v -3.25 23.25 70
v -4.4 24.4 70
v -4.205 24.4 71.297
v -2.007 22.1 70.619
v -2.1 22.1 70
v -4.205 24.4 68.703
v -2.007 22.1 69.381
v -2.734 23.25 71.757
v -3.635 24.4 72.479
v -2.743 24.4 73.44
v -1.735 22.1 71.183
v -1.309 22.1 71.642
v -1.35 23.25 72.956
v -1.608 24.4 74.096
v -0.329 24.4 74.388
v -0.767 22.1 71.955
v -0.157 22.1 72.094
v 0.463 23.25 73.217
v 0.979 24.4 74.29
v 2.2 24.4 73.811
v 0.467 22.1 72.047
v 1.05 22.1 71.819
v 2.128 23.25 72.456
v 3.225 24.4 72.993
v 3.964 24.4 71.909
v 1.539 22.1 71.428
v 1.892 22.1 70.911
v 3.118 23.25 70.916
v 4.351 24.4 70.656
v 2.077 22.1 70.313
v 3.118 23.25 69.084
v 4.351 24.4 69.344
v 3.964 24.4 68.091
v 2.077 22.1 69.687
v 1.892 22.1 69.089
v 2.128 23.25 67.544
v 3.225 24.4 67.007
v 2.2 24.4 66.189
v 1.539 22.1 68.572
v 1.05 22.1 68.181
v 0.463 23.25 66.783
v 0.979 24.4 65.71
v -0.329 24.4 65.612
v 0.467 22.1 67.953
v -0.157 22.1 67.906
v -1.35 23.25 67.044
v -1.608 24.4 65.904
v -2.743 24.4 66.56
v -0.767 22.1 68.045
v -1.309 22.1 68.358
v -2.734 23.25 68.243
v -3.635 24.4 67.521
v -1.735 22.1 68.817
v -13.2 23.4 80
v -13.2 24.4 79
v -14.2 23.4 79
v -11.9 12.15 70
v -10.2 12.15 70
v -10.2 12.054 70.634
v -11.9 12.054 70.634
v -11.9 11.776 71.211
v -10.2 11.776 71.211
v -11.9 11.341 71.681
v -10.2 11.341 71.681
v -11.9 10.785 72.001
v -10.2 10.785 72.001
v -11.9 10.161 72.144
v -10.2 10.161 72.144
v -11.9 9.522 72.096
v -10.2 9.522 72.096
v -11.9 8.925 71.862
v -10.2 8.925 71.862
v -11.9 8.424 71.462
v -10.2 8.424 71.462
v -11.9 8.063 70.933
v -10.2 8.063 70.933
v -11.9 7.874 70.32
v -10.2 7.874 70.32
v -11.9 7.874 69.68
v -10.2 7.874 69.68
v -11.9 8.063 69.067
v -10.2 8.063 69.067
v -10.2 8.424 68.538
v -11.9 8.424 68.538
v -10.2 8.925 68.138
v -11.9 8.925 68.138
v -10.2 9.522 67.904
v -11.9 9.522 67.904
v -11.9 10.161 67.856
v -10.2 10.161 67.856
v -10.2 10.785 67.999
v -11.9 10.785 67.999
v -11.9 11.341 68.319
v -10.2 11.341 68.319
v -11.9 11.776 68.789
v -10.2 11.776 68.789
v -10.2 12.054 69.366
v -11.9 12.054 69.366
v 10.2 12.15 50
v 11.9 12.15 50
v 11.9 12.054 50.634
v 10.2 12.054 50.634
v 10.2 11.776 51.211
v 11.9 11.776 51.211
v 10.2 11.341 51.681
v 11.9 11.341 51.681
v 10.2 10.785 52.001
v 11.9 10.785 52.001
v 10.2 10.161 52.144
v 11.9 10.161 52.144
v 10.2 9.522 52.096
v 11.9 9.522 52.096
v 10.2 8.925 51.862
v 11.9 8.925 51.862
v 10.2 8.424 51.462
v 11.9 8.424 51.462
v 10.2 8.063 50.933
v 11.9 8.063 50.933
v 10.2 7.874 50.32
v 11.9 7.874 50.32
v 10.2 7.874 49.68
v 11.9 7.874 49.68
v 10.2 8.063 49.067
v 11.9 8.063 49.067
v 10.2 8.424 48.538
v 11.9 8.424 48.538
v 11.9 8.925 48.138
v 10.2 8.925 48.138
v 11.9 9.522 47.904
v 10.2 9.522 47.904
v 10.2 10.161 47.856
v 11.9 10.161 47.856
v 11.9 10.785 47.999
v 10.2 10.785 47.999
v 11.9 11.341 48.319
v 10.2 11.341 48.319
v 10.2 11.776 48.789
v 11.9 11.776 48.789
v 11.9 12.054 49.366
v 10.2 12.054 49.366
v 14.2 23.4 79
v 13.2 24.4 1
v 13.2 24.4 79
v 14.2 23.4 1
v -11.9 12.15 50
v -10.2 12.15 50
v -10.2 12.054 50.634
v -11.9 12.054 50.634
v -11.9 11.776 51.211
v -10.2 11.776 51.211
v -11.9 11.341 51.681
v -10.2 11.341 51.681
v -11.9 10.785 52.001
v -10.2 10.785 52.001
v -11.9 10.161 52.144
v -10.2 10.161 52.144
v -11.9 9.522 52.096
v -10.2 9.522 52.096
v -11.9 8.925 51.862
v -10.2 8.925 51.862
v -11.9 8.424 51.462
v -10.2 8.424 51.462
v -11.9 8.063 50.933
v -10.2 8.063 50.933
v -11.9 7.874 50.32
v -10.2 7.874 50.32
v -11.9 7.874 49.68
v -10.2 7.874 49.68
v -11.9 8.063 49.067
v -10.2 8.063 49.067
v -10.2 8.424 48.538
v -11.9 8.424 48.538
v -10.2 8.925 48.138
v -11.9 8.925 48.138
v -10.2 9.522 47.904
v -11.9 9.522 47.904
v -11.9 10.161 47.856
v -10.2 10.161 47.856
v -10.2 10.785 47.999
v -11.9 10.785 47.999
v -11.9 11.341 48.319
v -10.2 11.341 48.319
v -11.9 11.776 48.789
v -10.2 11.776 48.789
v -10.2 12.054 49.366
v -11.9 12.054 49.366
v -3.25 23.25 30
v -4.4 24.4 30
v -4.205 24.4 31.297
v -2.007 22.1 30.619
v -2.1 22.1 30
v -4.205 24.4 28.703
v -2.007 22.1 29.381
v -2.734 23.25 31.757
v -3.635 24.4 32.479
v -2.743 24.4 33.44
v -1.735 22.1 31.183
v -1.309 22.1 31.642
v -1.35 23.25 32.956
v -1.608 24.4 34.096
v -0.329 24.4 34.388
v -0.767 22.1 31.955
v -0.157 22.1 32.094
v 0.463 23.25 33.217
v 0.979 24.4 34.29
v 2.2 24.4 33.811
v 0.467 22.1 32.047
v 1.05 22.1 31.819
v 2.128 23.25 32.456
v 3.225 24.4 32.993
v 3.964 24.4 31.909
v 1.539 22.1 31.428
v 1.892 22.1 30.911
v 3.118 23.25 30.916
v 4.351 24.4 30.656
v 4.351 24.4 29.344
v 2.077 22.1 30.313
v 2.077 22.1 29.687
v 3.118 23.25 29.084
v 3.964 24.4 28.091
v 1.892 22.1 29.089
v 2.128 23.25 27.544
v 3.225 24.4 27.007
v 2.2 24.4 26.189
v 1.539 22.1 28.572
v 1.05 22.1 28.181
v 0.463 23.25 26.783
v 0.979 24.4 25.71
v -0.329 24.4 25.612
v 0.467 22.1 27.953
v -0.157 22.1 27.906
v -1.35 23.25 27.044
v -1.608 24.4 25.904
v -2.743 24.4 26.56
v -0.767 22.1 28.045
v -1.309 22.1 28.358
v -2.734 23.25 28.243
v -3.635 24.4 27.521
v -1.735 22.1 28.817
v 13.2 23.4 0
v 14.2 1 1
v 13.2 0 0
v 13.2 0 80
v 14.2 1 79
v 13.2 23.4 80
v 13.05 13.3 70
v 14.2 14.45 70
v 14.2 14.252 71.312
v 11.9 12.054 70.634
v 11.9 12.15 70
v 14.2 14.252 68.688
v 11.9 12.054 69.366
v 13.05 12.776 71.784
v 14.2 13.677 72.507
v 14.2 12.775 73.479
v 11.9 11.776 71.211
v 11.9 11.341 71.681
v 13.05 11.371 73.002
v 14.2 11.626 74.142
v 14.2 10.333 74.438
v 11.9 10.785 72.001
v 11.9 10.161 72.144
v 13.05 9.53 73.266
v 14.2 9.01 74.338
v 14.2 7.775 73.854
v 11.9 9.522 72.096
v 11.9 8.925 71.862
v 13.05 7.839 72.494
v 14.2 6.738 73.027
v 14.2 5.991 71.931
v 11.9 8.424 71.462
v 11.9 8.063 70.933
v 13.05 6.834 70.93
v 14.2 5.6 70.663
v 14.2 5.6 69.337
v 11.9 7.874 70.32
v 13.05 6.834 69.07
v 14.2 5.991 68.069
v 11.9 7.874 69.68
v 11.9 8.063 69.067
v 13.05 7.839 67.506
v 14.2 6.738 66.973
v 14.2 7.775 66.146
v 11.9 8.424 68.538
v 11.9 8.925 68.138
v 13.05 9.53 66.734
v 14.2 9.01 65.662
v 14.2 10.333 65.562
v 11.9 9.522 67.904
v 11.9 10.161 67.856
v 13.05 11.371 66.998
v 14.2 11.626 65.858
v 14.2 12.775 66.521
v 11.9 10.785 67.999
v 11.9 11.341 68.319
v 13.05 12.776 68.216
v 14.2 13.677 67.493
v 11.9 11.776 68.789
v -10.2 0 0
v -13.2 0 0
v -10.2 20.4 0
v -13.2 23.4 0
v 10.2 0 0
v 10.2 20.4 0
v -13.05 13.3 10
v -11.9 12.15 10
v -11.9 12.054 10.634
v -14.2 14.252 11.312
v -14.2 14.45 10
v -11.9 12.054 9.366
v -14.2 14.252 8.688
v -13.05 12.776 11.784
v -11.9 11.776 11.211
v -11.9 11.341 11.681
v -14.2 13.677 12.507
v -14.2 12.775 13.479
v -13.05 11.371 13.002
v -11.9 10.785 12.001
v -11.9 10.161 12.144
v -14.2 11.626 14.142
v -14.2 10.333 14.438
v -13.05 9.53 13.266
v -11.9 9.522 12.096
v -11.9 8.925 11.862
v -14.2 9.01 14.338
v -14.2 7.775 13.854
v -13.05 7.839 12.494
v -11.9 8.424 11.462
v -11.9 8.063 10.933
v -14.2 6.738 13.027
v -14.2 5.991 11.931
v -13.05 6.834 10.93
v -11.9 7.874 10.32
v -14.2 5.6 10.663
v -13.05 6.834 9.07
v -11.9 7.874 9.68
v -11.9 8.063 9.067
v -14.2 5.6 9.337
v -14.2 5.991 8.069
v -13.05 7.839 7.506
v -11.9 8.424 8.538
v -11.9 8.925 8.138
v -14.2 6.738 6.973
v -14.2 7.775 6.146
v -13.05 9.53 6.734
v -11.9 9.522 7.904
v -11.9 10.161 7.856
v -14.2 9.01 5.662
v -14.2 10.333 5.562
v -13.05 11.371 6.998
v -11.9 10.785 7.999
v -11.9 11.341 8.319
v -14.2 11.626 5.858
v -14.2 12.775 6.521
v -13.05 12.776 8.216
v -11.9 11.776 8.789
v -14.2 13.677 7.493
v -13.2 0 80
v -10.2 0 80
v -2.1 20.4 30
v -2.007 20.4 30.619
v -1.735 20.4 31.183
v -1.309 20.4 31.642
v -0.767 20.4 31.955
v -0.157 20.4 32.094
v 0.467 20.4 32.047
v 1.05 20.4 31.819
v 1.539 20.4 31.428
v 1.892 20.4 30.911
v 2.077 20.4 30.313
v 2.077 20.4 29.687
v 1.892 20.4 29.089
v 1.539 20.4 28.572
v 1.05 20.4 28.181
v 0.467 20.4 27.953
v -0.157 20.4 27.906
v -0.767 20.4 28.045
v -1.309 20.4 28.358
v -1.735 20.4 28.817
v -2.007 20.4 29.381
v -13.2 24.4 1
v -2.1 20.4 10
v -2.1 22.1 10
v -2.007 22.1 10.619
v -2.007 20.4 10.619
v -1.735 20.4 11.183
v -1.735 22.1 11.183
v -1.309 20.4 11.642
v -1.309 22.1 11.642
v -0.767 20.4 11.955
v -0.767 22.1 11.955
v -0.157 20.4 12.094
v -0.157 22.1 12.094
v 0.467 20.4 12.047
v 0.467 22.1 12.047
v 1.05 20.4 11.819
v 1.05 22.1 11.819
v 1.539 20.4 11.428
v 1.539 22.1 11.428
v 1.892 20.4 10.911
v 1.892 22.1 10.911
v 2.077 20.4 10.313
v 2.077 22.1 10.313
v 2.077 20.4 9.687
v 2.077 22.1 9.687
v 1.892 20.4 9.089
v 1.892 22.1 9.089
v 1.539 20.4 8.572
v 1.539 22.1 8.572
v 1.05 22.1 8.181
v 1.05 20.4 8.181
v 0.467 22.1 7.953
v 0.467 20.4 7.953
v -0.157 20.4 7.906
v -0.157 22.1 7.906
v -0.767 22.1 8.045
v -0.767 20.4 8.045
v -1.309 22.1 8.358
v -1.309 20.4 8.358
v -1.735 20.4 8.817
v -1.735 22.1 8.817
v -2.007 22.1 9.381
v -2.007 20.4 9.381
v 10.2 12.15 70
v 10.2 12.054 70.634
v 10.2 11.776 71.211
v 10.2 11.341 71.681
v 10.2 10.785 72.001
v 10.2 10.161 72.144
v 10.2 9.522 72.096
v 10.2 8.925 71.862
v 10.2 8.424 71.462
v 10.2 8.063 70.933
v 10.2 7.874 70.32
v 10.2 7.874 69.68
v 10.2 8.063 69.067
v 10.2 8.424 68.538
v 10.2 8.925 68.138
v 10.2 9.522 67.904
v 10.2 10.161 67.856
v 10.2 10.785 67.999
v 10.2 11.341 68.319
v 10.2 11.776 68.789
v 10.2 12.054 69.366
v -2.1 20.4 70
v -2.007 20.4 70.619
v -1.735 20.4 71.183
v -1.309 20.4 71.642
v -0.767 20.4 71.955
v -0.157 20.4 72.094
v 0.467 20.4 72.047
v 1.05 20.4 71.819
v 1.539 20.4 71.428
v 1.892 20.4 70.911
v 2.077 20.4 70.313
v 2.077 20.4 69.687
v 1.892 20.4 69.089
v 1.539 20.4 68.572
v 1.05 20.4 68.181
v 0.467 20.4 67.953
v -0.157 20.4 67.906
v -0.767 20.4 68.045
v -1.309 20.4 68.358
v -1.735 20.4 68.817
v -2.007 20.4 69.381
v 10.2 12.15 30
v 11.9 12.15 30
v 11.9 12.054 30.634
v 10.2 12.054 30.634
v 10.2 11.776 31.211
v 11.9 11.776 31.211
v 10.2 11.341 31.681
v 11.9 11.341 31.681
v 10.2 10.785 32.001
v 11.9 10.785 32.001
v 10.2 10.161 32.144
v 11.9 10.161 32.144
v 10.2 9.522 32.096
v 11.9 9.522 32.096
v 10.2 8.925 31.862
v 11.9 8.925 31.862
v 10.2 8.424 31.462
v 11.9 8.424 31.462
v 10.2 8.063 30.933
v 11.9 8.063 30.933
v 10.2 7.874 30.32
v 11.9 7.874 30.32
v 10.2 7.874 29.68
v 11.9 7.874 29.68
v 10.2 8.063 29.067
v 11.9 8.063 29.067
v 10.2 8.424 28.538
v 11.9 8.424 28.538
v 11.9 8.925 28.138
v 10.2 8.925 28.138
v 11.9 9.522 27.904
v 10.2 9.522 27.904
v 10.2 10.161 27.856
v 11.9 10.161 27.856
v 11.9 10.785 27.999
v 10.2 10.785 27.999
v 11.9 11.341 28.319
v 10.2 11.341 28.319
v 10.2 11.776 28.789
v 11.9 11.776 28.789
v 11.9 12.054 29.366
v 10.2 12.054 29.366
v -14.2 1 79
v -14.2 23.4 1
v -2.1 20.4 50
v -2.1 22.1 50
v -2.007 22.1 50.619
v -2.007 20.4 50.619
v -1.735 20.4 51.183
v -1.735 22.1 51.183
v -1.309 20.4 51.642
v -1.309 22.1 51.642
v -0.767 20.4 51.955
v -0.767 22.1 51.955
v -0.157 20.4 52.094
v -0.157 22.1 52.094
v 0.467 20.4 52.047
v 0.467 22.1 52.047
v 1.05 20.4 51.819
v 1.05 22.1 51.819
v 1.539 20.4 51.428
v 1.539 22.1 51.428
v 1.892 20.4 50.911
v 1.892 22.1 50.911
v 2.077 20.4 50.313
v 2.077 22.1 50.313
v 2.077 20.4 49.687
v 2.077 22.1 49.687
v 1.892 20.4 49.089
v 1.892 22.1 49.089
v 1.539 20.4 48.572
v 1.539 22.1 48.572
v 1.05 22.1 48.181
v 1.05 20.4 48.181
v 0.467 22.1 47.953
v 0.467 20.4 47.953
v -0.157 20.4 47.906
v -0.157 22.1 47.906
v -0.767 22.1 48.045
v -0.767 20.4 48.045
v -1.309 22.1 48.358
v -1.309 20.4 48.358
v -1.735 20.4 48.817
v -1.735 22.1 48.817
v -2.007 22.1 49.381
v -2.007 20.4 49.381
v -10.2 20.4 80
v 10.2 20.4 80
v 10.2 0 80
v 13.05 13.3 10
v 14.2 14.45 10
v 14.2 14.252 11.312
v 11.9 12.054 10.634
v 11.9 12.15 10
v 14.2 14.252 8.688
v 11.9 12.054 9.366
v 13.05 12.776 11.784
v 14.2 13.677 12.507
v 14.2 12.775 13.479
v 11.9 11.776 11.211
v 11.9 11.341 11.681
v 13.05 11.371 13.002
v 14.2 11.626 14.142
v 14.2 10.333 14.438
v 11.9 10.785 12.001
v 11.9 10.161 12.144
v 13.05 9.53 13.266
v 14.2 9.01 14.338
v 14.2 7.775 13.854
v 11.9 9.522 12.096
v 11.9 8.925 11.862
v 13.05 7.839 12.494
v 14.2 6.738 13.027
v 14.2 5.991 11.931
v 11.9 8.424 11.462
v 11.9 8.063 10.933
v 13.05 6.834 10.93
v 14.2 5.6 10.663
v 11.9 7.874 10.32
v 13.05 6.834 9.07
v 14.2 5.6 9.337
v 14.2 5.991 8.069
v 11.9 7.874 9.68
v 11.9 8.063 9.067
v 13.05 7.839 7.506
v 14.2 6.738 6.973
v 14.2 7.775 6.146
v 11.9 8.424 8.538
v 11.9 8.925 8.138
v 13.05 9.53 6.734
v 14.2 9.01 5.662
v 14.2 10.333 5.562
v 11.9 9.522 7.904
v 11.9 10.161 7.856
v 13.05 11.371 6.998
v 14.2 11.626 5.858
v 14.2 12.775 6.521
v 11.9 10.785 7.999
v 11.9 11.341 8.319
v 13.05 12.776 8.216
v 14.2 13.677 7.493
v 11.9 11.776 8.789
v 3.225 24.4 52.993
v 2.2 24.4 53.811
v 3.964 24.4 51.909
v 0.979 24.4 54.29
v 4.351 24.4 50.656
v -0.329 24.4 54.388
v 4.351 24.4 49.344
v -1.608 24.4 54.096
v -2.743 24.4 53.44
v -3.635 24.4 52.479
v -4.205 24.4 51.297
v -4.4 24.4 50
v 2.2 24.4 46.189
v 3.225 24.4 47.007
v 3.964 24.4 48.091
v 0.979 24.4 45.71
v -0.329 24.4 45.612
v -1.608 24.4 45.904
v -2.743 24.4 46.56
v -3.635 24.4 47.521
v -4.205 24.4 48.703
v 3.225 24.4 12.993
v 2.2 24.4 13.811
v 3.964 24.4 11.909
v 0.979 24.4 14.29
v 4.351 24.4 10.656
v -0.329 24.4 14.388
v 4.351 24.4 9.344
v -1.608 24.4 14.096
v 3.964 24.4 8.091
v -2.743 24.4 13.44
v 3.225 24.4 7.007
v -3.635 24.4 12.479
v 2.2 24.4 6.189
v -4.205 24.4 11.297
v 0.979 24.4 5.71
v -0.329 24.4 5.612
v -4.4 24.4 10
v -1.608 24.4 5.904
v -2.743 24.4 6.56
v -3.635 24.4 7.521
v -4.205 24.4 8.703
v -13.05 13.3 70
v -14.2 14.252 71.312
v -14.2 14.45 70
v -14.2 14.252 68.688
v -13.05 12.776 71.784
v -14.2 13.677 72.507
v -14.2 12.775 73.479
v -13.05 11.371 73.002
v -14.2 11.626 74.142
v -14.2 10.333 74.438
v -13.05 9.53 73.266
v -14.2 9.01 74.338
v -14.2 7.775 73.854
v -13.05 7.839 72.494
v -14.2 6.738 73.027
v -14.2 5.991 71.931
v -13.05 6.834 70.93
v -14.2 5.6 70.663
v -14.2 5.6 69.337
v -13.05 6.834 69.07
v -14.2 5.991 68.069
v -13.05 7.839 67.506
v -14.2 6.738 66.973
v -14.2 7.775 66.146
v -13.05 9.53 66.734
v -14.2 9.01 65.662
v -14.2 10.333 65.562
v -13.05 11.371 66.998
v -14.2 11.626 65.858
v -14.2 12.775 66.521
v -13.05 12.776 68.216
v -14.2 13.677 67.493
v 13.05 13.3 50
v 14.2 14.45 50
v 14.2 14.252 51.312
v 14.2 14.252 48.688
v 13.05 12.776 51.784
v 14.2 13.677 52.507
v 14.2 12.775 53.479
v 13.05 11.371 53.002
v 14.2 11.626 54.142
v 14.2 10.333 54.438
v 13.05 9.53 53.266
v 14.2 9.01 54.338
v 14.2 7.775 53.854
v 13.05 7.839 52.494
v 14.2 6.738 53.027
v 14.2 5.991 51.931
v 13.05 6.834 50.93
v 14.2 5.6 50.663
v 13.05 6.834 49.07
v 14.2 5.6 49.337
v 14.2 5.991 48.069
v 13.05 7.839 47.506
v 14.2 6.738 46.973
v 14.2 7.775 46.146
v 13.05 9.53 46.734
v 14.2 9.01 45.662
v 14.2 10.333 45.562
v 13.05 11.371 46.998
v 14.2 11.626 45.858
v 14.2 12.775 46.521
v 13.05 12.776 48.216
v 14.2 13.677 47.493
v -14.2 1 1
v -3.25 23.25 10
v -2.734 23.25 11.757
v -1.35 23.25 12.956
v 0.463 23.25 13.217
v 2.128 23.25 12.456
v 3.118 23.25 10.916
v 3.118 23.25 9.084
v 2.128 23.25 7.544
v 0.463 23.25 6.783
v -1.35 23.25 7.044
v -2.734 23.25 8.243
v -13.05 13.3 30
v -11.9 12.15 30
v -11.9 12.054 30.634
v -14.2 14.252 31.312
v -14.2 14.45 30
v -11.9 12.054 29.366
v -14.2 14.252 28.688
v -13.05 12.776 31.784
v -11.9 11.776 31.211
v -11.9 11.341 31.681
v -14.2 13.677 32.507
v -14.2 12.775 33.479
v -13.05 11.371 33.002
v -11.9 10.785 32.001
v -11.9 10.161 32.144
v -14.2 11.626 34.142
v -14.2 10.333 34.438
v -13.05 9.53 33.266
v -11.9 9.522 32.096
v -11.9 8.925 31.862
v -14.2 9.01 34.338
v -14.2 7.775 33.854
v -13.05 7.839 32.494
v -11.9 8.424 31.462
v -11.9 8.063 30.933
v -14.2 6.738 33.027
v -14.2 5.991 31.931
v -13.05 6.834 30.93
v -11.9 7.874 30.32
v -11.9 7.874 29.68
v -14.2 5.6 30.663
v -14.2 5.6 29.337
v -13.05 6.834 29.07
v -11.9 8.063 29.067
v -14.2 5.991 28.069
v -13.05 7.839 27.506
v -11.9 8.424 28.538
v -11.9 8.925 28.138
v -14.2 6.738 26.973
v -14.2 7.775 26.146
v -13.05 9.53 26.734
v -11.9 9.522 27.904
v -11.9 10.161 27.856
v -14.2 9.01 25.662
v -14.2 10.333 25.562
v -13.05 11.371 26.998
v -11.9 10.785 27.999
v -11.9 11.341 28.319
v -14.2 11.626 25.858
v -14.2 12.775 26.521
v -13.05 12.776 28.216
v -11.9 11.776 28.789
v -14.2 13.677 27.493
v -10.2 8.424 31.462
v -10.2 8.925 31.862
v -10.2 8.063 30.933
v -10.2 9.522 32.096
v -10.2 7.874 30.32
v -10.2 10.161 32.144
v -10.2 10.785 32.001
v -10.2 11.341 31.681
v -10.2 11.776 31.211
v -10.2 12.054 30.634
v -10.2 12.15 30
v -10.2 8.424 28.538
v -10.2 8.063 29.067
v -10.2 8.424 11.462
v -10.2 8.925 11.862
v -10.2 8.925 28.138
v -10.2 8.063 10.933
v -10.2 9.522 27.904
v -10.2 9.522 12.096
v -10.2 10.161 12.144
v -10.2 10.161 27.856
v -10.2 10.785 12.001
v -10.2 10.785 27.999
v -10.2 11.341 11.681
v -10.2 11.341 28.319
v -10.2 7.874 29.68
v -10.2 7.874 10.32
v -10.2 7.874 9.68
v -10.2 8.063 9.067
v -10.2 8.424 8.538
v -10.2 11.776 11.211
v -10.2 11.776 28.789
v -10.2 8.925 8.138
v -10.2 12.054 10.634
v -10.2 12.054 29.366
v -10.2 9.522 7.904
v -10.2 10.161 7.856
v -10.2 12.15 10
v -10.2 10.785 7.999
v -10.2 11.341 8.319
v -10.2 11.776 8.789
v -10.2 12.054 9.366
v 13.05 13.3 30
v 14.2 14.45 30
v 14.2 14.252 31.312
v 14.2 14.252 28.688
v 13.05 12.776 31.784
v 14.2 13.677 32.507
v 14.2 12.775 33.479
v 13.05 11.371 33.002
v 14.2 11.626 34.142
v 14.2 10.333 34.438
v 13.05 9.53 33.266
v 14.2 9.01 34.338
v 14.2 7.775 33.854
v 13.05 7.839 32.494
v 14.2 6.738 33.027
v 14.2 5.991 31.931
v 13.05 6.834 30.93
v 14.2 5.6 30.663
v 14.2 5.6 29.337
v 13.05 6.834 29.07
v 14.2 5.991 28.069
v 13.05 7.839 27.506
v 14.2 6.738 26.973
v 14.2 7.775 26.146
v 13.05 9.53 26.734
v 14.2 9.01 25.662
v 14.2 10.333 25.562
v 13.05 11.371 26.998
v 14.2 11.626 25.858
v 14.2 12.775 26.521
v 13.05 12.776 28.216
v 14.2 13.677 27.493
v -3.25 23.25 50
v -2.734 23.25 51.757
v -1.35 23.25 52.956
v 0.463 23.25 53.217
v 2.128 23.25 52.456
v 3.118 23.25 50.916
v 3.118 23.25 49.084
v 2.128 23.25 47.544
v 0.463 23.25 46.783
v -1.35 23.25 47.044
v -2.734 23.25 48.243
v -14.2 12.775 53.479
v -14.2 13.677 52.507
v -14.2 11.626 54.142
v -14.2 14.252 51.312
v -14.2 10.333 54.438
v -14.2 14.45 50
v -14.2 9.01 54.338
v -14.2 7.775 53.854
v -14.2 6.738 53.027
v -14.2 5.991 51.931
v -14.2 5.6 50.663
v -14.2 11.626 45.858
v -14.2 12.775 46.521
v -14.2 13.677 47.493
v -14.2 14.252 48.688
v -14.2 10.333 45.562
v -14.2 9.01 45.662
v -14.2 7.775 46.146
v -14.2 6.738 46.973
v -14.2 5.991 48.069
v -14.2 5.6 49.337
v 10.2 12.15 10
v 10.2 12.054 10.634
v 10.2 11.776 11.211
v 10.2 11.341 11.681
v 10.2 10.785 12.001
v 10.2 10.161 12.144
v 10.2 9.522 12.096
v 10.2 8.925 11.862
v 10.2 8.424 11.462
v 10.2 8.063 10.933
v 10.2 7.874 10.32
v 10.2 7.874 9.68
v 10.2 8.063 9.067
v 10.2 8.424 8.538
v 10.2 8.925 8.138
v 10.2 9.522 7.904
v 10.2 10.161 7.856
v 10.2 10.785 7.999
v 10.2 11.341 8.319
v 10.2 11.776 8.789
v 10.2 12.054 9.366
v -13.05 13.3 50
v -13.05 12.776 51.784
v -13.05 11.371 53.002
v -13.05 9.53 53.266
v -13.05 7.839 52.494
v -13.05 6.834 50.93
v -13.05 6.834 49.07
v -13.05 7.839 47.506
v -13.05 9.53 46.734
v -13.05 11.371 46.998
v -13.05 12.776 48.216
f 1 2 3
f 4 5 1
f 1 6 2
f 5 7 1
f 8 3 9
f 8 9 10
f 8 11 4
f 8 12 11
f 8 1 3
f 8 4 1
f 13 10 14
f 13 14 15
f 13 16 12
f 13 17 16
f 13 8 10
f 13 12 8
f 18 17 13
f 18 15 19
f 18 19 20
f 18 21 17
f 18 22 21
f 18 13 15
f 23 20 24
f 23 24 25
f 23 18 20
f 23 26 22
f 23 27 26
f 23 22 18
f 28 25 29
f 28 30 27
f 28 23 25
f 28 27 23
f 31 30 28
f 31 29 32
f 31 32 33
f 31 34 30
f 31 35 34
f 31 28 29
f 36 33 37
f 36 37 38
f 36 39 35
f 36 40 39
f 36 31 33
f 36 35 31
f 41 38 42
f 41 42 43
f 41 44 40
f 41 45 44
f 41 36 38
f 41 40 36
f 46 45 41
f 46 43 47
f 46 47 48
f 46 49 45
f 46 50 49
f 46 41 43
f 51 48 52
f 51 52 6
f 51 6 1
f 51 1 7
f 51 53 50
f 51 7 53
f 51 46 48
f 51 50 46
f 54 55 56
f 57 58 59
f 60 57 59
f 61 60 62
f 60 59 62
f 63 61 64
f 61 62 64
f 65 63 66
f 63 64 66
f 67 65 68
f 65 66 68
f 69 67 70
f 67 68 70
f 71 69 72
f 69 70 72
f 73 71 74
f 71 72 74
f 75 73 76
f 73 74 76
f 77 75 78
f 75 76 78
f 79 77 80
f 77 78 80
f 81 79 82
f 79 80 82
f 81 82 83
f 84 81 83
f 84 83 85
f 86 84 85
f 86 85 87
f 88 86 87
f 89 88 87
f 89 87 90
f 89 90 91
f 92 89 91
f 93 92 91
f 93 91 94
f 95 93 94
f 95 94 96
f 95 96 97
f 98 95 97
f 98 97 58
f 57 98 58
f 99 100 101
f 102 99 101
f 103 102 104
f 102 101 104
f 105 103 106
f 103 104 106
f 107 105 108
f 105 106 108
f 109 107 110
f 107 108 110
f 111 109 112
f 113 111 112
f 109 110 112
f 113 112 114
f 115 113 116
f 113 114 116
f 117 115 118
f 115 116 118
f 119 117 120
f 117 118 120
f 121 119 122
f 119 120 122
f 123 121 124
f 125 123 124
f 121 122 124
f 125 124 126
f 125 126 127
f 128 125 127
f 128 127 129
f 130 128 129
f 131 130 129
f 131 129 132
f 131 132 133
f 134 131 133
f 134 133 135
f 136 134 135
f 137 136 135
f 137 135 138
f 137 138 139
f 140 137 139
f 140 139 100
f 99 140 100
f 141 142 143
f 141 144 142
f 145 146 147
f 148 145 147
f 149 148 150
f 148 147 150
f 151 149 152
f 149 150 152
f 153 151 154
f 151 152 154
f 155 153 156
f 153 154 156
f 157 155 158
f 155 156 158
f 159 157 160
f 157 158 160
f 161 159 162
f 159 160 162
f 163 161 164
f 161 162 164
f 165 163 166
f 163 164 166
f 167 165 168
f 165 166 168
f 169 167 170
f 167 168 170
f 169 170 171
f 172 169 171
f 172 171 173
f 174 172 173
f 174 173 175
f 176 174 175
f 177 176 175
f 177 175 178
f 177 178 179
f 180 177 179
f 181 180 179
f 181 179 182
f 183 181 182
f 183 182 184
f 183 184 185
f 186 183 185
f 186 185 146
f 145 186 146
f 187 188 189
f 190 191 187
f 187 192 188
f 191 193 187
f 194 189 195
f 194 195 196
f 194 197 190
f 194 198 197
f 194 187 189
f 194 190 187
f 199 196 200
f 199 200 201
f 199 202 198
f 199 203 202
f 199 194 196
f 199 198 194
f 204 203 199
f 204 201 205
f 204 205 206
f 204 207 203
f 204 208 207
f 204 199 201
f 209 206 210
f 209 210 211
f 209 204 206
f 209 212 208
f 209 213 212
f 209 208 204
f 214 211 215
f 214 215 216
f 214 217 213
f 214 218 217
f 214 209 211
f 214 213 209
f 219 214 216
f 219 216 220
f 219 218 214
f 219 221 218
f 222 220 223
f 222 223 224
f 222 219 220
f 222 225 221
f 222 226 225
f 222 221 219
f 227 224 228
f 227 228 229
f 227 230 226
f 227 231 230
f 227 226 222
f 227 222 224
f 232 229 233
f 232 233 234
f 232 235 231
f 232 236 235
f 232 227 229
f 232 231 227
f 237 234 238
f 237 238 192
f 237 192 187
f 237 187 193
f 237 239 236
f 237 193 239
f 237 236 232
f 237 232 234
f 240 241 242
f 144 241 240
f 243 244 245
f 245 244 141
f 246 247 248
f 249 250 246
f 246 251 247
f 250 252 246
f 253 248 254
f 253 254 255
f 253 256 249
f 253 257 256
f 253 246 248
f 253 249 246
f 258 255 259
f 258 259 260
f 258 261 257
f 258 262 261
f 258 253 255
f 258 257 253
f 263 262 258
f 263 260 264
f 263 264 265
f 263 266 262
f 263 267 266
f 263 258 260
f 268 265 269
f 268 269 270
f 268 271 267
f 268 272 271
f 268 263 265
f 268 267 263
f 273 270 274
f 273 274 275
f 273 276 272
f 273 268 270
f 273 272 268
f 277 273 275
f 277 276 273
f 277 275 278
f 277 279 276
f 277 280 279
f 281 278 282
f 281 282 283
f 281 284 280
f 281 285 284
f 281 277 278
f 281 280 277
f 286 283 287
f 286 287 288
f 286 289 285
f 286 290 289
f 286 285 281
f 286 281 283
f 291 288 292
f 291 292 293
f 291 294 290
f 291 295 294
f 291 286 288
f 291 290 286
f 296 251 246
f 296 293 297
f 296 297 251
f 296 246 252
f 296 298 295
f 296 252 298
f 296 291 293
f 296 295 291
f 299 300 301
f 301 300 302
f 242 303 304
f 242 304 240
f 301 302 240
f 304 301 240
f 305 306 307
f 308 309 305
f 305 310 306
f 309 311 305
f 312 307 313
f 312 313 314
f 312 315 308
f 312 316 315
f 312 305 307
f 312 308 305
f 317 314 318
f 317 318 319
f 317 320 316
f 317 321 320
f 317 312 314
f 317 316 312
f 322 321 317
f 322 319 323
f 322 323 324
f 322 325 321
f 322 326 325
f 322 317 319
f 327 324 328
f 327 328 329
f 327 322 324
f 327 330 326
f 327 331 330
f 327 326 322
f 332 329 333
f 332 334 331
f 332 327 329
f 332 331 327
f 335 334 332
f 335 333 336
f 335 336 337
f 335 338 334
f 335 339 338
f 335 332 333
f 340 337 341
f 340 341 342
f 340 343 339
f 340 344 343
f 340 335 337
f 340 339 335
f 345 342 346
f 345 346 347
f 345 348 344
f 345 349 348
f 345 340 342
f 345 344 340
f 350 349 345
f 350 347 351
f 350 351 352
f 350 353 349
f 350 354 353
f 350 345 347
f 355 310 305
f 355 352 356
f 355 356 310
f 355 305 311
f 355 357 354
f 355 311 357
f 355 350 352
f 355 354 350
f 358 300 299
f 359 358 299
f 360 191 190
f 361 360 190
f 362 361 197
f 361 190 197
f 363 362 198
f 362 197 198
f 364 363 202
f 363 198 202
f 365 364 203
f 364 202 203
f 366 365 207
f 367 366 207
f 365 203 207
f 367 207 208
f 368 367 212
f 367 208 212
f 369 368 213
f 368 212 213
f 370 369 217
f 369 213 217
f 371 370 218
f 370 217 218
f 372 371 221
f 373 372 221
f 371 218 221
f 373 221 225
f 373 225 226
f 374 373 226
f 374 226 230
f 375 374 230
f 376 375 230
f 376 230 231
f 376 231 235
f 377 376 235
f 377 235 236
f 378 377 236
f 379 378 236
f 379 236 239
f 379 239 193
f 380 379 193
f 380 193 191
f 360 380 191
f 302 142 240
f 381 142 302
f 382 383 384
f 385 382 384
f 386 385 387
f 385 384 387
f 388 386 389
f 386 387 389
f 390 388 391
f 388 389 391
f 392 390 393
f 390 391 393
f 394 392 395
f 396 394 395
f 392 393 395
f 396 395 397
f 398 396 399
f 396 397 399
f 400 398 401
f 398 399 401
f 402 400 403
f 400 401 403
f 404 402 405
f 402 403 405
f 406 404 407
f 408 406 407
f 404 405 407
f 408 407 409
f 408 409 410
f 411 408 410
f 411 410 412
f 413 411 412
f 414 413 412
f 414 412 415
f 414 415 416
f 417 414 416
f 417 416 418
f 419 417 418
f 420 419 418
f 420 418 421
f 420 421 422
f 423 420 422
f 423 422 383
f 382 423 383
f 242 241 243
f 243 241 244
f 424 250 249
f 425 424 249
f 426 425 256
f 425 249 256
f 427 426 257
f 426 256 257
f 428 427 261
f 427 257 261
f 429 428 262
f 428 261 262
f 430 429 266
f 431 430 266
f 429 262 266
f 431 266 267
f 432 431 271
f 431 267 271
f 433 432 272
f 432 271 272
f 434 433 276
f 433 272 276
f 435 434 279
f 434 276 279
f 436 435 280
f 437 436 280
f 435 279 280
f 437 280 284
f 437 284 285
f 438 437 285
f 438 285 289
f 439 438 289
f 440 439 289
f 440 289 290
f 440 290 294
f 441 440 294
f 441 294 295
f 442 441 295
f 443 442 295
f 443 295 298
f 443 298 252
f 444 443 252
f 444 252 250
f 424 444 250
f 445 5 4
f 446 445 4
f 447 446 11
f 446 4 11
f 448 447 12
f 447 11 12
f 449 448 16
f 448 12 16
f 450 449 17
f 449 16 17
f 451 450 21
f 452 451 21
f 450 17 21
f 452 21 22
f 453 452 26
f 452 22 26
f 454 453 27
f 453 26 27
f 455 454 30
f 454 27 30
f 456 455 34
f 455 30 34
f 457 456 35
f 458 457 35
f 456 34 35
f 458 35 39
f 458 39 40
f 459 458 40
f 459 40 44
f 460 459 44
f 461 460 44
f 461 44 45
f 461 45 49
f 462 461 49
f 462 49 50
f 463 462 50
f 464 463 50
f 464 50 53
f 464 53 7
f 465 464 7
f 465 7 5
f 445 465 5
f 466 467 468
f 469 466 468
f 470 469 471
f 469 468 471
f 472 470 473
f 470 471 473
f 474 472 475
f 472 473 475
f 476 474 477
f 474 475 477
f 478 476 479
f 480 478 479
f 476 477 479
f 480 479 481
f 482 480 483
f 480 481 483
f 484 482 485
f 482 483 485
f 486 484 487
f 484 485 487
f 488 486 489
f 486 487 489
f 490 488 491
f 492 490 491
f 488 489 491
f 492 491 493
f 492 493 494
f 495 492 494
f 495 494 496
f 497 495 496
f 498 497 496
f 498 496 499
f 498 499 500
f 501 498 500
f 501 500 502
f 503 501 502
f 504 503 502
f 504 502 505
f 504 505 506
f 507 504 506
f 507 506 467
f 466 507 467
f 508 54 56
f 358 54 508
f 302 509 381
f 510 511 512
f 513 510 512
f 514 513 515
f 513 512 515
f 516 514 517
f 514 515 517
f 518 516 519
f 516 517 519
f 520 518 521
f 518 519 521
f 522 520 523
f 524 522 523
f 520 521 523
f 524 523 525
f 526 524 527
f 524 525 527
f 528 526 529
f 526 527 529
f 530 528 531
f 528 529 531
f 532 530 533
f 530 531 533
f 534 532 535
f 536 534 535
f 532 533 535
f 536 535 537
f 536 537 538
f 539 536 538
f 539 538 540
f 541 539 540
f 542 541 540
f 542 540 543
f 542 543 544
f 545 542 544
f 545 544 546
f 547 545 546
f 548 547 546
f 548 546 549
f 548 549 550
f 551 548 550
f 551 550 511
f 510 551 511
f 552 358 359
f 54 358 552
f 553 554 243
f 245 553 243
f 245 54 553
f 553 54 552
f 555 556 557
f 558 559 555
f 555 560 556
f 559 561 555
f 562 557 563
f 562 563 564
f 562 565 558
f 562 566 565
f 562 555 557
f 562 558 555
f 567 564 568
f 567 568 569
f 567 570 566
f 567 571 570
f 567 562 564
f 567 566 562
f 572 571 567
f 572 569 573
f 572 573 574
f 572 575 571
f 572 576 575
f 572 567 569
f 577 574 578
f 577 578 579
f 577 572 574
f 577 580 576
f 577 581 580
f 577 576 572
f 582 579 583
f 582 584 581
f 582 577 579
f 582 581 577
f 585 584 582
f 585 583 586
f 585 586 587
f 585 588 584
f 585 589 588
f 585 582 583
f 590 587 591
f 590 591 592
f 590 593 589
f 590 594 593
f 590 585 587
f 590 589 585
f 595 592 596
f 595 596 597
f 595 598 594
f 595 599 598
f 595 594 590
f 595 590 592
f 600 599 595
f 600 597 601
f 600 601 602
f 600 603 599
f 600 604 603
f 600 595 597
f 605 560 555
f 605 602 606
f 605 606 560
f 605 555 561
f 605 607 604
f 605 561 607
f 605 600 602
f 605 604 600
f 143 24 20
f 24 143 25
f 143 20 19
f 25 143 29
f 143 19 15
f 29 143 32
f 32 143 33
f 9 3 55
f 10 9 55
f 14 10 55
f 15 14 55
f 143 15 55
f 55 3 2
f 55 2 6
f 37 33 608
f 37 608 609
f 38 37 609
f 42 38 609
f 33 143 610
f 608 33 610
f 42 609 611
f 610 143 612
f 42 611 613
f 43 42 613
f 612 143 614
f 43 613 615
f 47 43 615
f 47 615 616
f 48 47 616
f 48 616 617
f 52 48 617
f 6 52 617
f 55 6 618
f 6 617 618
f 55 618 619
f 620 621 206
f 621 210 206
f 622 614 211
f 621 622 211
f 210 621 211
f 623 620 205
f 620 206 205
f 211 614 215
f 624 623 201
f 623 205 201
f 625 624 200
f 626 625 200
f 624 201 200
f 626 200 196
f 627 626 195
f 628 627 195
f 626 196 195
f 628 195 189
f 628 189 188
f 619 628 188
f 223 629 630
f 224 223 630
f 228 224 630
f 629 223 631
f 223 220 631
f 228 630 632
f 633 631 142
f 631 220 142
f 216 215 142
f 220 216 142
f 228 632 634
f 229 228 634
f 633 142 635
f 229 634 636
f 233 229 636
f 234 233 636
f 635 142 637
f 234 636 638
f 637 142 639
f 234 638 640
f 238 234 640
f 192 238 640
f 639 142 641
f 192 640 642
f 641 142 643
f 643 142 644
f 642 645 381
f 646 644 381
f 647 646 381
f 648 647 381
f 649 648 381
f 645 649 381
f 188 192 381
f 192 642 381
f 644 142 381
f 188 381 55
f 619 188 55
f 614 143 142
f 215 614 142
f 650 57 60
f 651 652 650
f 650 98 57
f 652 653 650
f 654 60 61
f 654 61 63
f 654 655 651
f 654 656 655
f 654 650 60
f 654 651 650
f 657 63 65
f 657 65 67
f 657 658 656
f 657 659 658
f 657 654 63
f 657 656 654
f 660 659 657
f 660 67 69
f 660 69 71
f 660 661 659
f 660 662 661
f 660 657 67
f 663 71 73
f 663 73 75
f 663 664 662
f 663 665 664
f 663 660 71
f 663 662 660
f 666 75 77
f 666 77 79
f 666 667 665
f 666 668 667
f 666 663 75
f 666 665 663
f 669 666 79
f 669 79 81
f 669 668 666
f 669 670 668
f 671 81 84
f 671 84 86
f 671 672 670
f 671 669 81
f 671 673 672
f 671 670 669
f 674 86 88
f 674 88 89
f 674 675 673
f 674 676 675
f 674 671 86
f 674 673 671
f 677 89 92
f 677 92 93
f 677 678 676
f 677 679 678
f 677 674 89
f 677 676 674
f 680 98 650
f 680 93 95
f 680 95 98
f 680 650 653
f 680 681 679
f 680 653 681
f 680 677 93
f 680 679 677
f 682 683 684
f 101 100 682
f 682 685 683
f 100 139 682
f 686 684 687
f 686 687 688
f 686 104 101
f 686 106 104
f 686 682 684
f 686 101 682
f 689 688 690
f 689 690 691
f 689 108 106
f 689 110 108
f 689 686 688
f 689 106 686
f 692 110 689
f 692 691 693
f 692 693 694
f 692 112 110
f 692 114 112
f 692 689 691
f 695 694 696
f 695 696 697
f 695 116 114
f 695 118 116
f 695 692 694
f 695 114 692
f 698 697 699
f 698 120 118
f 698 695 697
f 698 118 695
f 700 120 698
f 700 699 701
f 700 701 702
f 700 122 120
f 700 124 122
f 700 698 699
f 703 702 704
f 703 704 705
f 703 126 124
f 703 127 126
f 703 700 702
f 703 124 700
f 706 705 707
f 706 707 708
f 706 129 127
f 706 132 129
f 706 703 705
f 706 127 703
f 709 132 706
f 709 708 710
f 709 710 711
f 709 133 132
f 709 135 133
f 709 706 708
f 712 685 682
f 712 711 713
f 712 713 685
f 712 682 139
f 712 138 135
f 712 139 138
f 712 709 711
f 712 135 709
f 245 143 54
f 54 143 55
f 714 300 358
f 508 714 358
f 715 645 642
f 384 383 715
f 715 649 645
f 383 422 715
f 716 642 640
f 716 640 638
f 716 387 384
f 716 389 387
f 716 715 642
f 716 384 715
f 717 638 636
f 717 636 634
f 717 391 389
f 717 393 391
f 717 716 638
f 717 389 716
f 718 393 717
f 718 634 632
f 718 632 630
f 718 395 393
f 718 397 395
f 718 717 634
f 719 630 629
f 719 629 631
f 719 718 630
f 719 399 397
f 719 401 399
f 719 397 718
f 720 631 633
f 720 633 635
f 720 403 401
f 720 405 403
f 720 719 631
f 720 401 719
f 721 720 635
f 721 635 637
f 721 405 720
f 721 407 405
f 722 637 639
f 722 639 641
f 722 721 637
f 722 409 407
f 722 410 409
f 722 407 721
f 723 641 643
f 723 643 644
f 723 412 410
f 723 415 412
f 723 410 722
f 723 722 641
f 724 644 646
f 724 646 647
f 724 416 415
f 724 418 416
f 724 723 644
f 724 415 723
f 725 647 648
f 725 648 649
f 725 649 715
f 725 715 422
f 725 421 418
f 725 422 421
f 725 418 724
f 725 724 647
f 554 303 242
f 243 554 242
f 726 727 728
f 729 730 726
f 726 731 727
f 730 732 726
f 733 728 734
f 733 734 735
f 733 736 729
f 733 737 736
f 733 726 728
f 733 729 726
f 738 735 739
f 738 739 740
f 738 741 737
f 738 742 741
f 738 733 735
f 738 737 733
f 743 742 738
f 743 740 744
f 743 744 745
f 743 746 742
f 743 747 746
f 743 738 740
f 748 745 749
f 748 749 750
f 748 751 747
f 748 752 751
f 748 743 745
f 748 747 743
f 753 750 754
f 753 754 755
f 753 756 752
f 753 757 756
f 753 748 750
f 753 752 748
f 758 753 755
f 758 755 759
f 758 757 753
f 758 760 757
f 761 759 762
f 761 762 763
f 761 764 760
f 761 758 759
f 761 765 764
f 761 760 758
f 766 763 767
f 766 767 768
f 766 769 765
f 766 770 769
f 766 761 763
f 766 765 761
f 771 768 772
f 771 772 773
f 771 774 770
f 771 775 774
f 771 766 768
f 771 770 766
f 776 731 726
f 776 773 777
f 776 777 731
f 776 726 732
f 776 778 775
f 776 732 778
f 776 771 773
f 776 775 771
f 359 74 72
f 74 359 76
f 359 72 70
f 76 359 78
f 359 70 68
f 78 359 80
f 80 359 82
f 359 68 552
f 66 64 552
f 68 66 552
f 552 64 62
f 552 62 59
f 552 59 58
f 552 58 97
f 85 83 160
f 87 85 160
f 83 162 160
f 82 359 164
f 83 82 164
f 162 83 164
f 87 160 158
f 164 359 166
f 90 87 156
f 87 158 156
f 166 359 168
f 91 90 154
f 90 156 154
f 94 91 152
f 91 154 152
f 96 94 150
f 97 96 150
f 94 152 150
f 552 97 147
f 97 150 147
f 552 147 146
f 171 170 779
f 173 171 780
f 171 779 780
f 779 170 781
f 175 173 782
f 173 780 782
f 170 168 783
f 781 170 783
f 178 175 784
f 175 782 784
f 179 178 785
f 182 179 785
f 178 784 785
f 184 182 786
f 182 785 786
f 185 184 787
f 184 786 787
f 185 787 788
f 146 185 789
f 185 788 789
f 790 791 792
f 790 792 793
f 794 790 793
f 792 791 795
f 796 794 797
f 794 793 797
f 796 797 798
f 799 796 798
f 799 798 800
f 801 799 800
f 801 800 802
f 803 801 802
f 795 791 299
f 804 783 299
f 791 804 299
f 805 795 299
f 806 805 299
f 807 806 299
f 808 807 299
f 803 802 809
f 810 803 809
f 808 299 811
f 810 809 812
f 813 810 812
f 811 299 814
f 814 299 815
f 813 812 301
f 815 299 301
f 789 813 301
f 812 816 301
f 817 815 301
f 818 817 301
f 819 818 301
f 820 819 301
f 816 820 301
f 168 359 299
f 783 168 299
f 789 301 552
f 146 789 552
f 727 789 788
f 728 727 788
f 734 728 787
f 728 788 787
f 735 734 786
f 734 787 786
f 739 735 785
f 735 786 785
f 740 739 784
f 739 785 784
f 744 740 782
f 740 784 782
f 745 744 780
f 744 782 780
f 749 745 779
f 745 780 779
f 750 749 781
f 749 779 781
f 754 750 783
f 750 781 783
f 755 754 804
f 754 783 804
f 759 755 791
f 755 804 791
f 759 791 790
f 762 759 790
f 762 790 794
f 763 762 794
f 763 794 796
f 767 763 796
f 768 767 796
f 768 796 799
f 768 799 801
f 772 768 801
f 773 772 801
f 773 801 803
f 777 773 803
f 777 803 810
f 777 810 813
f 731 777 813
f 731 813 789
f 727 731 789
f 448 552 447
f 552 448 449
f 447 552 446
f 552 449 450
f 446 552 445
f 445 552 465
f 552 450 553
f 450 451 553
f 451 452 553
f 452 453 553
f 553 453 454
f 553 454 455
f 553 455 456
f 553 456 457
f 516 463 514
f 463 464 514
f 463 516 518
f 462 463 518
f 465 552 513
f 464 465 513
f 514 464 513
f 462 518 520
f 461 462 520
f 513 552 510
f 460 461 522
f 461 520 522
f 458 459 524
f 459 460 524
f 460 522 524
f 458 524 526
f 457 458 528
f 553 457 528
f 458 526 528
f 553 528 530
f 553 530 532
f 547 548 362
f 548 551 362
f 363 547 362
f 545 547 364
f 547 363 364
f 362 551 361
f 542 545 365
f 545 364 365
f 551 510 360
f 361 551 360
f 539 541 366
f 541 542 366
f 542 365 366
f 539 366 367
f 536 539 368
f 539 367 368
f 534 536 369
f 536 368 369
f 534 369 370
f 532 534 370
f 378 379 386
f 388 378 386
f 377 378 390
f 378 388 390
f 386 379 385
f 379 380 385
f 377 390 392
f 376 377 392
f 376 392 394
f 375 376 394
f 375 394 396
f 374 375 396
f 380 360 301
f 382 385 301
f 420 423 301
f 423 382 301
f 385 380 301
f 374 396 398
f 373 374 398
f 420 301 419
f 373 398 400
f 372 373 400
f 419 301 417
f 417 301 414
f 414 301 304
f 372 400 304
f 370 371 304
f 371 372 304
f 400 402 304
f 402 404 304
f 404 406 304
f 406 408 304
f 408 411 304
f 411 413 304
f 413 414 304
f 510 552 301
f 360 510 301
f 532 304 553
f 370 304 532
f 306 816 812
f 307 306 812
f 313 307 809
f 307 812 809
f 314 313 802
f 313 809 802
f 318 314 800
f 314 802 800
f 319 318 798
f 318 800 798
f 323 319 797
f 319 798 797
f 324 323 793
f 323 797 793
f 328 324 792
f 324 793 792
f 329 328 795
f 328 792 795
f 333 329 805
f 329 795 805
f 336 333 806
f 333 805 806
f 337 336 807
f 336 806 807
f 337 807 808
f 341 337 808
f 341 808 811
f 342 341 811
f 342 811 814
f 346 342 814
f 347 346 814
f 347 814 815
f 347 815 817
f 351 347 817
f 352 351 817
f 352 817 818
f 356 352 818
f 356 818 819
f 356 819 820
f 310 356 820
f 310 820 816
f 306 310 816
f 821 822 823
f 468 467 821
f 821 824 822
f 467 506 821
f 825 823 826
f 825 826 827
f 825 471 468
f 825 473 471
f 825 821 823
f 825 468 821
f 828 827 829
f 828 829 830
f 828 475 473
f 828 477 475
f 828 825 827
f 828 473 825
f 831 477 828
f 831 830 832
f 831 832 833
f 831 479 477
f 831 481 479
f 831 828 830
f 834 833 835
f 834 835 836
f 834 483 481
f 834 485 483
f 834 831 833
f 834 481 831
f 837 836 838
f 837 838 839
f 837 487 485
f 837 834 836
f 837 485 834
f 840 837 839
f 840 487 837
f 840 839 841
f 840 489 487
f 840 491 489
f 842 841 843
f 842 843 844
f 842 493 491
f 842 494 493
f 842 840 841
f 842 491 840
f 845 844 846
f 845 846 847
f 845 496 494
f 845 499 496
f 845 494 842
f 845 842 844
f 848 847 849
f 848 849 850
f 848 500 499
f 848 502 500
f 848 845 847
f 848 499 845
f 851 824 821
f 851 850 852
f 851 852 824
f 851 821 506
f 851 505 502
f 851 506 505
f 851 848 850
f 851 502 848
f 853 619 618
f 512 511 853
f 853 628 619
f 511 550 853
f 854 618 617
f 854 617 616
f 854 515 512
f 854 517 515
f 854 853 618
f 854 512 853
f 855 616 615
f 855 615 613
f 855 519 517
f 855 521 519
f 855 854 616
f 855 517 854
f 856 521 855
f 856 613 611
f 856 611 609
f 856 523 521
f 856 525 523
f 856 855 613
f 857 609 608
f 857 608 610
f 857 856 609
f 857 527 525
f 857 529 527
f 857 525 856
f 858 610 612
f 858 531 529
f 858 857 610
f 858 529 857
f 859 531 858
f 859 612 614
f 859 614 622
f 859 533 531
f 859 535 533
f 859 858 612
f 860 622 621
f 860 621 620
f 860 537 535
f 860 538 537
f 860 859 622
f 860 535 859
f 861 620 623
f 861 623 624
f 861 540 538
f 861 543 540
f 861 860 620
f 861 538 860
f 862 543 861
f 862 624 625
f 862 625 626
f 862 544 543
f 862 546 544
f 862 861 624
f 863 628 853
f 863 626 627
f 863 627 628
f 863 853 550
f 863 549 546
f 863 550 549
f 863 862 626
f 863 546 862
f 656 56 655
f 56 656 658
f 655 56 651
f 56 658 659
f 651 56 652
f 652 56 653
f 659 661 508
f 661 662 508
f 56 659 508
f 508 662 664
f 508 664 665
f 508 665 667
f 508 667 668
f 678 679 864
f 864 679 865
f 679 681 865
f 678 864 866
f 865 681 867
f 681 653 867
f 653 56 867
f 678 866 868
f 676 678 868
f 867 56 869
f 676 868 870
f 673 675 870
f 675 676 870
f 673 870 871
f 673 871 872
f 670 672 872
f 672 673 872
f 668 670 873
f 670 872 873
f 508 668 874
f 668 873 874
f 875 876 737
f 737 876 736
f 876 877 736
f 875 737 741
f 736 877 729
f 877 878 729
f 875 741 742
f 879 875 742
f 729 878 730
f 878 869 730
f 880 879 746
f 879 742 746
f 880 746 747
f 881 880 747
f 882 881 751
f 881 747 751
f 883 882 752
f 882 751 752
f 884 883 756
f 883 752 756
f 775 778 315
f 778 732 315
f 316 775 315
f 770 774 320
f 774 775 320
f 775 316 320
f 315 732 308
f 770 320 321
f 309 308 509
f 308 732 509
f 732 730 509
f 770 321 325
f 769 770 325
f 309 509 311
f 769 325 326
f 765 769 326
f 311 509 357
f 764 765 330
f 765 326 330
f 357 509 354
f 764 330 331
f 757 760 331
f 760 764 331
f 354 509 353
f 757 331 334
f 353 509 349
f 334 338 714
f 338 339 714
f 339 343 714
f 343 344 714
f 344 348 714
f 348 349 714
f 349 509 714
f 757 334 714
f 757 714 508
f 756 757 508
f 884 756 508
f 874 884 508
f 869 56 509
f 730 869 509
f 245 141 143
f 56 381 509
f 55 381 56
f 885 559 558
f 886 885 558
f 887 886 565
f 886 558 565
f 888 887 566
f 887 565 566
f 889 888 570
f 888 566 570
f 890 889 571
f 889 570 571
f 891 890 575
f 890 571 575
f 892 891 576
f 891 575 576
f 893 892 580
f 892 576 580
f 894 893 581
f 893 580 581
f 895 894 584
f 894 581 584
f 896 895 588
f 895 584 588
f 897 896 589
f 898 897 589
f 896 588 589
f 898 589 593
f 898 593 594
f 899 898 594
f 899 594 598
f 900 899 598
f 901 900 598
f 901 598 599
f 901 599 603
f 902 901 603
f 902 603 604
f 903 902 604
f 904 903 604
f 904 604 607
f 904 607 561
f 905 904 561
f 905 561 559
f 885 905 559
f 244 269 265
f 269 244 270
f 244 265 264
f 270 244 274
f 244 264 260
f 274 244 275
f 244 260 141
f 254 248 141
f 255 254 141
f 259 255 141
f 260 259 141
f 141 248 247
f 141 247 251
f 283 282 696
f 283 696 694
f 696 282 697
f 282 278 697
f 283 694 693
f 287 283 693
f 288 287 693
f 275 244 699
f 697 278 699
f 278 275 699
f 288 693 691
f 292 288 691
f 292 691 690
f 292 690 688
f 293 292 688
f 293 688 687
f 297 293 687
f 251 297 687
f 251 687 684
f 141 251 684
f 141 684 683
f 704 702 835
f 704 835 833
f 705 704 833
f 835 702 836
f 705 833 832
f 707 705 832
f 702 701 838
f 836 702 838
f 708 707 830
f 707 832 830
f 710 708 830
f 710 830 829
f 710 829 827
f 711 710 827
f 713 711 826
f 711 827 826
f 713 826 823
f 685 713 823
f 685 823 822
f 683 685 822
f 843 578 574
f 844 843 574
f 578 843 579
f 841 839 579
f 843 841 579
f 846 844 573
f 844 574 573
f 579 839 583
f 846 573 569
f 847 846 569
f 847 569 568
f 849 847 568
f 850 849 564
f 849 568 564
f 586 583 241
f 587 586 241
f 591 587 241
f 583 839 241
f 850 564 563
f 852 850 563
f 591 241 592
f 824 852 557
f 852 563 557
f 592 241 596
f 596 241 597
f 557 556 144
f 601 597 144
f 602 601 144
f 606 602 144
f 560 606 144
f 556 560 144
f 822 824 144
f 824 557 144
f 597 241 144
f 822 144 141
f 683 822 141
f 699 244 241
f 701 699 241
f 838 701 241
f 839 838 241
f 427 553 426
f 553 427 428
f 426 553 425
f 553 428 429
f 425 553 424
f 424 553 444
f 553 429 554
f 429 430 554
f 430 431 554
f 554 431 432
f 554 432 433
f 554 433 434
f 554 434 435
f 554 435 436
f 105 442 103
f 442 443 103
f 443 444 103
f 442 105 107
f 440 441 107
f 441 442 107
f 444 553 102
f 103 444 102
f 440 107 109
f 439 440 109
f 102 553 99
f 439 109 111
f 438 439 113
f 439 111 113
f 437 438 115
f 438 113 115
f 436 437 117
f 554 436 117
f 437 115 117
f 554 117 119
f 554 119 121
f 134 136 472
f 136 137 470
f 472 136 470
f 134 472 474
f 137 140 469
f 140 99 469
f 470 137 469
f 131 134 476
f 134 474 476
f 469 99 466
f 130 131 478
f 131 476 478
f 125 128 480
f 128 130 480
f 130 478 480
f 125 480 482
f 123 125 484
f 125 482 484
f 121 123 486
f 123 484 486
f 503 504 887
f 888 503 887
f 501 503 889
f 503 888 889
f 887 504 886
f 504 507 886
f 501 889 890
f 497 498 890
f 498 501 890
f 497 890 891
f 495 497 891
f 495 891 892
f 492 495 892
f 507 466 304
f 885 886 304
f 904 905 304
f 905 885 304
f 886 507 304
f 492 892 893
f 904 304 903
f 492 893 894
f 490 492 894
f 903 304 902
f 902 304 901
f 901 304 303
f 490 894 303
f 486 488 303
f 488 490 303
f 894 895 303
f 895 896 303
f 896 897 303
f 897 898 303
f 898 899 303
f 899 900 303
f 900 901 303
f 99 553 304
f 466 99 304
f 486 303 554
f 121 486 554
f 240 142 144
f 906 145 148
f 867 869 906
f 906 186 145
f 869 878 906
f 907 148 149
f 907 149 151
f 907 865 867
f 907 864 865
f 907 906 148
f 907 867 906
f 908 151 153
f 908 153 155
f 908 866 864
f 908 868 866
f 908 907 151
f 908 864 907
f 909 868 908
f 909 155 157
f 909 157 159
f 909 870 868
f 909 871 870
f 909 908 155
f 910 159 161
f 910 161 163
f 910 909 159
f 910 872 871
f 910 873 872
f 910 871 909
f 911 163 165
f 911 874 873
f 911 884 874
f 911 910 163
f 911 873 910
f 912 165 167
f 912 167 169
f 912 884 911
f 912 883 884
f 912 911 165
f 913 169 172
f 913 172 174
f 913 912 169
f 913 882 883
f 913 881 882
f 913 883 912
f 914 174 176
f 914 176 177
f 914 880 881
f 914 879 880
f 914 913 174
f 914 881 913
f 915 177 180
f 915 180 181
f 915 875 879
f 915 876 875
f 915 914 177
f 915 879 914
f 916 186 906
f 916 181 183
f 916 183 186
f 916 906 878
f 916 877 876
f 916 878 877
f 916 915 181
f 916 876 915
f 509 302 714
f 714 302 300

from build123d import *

# Parameters (mm, degrees)
BOSS_EXTRUDE1_DEPTH = 80
SKETCH2_R           = 2.15
CUT_EXTRUDE1_DEPTH  = 89.328477854
SKETCH3_R           = 2.1
CUT_EXTRUDE2_DEPTH  = 85.835134231
CHAMFER1_SIZE       = 2.3
CHAMFER2_SIZE       = 1


with BuildPart() as part:
    # Sketch1 → Boss-Extrude1 (new body)
    with BuildSketch(Plane.XY):
        Polygon((-10.2, 0), (-10.2, 20.4), (10.2, 20.4), (10.2, 0), (14.2, 0), (14.2, 24.4), (-14.2, 24.4), (-14.2, 0), align=None)
    extrude(amount=BOSS_EXTRUDE1_DEPTH)

    # Sketch2 → Cut-Extrude1 (cut, through all)
    with BuildSketch(Plane(origin=(14.2, 0, 0), x_dir=(0, 0, -1), z_dir=(1, 0, 0))):
        with Locations(Location((-50, 10, 0), (0, 0, 90))):
            Circle(SKETCH2_R)
        with Locations(Location((-70, 10, 0), (0, 0, 90))):
            Circle(SKETCH2_R)
        with Locations(Location((-30, 10, 0), (0, 0, 90))):
            Circle(SKETCH2_R)
        with Locations(Location((-10, 10, 0), (0, 0, 90))):
            Circle(SKETCH2_R)
    extrude(amount=-CUT_EXTRUDE1_DEPTH, mode=Mode.SUBTRACT)

    # Sketch3 → Cut-Extrude2 (cut, through all)
    with BuildSketch(Plane(origin=(0, 24.4, 0), x_dir=(1, 0, 0), z_dir=(0, 1, 0))):
        with Locations(Location((0, -10, 0), (0, 0, 180))):
            Circle(SKETCH3_R)
        with Locations(Location((0, -30, 0), (0, 0, 180))):
            Circle(SKETCH3_R)
        with Locations(Location((0, -50, 0), (0, 0, 180))):
            Circle(SKETCH3_R)
        with Locations(Location((0, -70, 0), (0, 0, 180))):
            Circle(SKETCH3_R)
    extrude(amount=-CUT_EXTRUDE2_DEPTH, mode=Mode.SUBTRACT)

    # Chamfer1
    chamfer1_edges = [part.edges().sort_by_distance(p)[0] for p in [
        (-14.2, 7.85, 10),
        (14.2, 7.85, 10),
        (-14.2, 7.85, 30),
        (14.2, 7.85, 30),
        (-14.2, 7.85, 70),
        (14.2, 7.85, 70),
        (-14.2, 7.85, 50),
        (14.2, 7.85, 50),
        (2.1, 24.4, 10),
        (2.1, 24.4, 30),
        (2.1, 24.4, 50),
        (2.1, 24.4, 70),
    ]]
    chamfer(chamfer1_edges, length=CHAMFER1_SIZE)

    # Chamfer2
    chamfer2_edges = [part.edges().sort_by_distance(p)[0] for p in [
        (-14.2, 0, 40),
        (-14.2, 24.4, 40),
        (14.2, 24.4, 40),
        (14.2, 0, 40),
        (14.2, 12.2, 80),
        (0, 24.4, 80),
        (-14.2, 12.2, 80),
        (-14.2, 12.2, 0),
        (0, 24.4, 0),
        (14.2, 12.2, 0),
    ]]
    chamfer(chamfer2_edges, length=CHAMFER2_SIZE)


solid = part.part
